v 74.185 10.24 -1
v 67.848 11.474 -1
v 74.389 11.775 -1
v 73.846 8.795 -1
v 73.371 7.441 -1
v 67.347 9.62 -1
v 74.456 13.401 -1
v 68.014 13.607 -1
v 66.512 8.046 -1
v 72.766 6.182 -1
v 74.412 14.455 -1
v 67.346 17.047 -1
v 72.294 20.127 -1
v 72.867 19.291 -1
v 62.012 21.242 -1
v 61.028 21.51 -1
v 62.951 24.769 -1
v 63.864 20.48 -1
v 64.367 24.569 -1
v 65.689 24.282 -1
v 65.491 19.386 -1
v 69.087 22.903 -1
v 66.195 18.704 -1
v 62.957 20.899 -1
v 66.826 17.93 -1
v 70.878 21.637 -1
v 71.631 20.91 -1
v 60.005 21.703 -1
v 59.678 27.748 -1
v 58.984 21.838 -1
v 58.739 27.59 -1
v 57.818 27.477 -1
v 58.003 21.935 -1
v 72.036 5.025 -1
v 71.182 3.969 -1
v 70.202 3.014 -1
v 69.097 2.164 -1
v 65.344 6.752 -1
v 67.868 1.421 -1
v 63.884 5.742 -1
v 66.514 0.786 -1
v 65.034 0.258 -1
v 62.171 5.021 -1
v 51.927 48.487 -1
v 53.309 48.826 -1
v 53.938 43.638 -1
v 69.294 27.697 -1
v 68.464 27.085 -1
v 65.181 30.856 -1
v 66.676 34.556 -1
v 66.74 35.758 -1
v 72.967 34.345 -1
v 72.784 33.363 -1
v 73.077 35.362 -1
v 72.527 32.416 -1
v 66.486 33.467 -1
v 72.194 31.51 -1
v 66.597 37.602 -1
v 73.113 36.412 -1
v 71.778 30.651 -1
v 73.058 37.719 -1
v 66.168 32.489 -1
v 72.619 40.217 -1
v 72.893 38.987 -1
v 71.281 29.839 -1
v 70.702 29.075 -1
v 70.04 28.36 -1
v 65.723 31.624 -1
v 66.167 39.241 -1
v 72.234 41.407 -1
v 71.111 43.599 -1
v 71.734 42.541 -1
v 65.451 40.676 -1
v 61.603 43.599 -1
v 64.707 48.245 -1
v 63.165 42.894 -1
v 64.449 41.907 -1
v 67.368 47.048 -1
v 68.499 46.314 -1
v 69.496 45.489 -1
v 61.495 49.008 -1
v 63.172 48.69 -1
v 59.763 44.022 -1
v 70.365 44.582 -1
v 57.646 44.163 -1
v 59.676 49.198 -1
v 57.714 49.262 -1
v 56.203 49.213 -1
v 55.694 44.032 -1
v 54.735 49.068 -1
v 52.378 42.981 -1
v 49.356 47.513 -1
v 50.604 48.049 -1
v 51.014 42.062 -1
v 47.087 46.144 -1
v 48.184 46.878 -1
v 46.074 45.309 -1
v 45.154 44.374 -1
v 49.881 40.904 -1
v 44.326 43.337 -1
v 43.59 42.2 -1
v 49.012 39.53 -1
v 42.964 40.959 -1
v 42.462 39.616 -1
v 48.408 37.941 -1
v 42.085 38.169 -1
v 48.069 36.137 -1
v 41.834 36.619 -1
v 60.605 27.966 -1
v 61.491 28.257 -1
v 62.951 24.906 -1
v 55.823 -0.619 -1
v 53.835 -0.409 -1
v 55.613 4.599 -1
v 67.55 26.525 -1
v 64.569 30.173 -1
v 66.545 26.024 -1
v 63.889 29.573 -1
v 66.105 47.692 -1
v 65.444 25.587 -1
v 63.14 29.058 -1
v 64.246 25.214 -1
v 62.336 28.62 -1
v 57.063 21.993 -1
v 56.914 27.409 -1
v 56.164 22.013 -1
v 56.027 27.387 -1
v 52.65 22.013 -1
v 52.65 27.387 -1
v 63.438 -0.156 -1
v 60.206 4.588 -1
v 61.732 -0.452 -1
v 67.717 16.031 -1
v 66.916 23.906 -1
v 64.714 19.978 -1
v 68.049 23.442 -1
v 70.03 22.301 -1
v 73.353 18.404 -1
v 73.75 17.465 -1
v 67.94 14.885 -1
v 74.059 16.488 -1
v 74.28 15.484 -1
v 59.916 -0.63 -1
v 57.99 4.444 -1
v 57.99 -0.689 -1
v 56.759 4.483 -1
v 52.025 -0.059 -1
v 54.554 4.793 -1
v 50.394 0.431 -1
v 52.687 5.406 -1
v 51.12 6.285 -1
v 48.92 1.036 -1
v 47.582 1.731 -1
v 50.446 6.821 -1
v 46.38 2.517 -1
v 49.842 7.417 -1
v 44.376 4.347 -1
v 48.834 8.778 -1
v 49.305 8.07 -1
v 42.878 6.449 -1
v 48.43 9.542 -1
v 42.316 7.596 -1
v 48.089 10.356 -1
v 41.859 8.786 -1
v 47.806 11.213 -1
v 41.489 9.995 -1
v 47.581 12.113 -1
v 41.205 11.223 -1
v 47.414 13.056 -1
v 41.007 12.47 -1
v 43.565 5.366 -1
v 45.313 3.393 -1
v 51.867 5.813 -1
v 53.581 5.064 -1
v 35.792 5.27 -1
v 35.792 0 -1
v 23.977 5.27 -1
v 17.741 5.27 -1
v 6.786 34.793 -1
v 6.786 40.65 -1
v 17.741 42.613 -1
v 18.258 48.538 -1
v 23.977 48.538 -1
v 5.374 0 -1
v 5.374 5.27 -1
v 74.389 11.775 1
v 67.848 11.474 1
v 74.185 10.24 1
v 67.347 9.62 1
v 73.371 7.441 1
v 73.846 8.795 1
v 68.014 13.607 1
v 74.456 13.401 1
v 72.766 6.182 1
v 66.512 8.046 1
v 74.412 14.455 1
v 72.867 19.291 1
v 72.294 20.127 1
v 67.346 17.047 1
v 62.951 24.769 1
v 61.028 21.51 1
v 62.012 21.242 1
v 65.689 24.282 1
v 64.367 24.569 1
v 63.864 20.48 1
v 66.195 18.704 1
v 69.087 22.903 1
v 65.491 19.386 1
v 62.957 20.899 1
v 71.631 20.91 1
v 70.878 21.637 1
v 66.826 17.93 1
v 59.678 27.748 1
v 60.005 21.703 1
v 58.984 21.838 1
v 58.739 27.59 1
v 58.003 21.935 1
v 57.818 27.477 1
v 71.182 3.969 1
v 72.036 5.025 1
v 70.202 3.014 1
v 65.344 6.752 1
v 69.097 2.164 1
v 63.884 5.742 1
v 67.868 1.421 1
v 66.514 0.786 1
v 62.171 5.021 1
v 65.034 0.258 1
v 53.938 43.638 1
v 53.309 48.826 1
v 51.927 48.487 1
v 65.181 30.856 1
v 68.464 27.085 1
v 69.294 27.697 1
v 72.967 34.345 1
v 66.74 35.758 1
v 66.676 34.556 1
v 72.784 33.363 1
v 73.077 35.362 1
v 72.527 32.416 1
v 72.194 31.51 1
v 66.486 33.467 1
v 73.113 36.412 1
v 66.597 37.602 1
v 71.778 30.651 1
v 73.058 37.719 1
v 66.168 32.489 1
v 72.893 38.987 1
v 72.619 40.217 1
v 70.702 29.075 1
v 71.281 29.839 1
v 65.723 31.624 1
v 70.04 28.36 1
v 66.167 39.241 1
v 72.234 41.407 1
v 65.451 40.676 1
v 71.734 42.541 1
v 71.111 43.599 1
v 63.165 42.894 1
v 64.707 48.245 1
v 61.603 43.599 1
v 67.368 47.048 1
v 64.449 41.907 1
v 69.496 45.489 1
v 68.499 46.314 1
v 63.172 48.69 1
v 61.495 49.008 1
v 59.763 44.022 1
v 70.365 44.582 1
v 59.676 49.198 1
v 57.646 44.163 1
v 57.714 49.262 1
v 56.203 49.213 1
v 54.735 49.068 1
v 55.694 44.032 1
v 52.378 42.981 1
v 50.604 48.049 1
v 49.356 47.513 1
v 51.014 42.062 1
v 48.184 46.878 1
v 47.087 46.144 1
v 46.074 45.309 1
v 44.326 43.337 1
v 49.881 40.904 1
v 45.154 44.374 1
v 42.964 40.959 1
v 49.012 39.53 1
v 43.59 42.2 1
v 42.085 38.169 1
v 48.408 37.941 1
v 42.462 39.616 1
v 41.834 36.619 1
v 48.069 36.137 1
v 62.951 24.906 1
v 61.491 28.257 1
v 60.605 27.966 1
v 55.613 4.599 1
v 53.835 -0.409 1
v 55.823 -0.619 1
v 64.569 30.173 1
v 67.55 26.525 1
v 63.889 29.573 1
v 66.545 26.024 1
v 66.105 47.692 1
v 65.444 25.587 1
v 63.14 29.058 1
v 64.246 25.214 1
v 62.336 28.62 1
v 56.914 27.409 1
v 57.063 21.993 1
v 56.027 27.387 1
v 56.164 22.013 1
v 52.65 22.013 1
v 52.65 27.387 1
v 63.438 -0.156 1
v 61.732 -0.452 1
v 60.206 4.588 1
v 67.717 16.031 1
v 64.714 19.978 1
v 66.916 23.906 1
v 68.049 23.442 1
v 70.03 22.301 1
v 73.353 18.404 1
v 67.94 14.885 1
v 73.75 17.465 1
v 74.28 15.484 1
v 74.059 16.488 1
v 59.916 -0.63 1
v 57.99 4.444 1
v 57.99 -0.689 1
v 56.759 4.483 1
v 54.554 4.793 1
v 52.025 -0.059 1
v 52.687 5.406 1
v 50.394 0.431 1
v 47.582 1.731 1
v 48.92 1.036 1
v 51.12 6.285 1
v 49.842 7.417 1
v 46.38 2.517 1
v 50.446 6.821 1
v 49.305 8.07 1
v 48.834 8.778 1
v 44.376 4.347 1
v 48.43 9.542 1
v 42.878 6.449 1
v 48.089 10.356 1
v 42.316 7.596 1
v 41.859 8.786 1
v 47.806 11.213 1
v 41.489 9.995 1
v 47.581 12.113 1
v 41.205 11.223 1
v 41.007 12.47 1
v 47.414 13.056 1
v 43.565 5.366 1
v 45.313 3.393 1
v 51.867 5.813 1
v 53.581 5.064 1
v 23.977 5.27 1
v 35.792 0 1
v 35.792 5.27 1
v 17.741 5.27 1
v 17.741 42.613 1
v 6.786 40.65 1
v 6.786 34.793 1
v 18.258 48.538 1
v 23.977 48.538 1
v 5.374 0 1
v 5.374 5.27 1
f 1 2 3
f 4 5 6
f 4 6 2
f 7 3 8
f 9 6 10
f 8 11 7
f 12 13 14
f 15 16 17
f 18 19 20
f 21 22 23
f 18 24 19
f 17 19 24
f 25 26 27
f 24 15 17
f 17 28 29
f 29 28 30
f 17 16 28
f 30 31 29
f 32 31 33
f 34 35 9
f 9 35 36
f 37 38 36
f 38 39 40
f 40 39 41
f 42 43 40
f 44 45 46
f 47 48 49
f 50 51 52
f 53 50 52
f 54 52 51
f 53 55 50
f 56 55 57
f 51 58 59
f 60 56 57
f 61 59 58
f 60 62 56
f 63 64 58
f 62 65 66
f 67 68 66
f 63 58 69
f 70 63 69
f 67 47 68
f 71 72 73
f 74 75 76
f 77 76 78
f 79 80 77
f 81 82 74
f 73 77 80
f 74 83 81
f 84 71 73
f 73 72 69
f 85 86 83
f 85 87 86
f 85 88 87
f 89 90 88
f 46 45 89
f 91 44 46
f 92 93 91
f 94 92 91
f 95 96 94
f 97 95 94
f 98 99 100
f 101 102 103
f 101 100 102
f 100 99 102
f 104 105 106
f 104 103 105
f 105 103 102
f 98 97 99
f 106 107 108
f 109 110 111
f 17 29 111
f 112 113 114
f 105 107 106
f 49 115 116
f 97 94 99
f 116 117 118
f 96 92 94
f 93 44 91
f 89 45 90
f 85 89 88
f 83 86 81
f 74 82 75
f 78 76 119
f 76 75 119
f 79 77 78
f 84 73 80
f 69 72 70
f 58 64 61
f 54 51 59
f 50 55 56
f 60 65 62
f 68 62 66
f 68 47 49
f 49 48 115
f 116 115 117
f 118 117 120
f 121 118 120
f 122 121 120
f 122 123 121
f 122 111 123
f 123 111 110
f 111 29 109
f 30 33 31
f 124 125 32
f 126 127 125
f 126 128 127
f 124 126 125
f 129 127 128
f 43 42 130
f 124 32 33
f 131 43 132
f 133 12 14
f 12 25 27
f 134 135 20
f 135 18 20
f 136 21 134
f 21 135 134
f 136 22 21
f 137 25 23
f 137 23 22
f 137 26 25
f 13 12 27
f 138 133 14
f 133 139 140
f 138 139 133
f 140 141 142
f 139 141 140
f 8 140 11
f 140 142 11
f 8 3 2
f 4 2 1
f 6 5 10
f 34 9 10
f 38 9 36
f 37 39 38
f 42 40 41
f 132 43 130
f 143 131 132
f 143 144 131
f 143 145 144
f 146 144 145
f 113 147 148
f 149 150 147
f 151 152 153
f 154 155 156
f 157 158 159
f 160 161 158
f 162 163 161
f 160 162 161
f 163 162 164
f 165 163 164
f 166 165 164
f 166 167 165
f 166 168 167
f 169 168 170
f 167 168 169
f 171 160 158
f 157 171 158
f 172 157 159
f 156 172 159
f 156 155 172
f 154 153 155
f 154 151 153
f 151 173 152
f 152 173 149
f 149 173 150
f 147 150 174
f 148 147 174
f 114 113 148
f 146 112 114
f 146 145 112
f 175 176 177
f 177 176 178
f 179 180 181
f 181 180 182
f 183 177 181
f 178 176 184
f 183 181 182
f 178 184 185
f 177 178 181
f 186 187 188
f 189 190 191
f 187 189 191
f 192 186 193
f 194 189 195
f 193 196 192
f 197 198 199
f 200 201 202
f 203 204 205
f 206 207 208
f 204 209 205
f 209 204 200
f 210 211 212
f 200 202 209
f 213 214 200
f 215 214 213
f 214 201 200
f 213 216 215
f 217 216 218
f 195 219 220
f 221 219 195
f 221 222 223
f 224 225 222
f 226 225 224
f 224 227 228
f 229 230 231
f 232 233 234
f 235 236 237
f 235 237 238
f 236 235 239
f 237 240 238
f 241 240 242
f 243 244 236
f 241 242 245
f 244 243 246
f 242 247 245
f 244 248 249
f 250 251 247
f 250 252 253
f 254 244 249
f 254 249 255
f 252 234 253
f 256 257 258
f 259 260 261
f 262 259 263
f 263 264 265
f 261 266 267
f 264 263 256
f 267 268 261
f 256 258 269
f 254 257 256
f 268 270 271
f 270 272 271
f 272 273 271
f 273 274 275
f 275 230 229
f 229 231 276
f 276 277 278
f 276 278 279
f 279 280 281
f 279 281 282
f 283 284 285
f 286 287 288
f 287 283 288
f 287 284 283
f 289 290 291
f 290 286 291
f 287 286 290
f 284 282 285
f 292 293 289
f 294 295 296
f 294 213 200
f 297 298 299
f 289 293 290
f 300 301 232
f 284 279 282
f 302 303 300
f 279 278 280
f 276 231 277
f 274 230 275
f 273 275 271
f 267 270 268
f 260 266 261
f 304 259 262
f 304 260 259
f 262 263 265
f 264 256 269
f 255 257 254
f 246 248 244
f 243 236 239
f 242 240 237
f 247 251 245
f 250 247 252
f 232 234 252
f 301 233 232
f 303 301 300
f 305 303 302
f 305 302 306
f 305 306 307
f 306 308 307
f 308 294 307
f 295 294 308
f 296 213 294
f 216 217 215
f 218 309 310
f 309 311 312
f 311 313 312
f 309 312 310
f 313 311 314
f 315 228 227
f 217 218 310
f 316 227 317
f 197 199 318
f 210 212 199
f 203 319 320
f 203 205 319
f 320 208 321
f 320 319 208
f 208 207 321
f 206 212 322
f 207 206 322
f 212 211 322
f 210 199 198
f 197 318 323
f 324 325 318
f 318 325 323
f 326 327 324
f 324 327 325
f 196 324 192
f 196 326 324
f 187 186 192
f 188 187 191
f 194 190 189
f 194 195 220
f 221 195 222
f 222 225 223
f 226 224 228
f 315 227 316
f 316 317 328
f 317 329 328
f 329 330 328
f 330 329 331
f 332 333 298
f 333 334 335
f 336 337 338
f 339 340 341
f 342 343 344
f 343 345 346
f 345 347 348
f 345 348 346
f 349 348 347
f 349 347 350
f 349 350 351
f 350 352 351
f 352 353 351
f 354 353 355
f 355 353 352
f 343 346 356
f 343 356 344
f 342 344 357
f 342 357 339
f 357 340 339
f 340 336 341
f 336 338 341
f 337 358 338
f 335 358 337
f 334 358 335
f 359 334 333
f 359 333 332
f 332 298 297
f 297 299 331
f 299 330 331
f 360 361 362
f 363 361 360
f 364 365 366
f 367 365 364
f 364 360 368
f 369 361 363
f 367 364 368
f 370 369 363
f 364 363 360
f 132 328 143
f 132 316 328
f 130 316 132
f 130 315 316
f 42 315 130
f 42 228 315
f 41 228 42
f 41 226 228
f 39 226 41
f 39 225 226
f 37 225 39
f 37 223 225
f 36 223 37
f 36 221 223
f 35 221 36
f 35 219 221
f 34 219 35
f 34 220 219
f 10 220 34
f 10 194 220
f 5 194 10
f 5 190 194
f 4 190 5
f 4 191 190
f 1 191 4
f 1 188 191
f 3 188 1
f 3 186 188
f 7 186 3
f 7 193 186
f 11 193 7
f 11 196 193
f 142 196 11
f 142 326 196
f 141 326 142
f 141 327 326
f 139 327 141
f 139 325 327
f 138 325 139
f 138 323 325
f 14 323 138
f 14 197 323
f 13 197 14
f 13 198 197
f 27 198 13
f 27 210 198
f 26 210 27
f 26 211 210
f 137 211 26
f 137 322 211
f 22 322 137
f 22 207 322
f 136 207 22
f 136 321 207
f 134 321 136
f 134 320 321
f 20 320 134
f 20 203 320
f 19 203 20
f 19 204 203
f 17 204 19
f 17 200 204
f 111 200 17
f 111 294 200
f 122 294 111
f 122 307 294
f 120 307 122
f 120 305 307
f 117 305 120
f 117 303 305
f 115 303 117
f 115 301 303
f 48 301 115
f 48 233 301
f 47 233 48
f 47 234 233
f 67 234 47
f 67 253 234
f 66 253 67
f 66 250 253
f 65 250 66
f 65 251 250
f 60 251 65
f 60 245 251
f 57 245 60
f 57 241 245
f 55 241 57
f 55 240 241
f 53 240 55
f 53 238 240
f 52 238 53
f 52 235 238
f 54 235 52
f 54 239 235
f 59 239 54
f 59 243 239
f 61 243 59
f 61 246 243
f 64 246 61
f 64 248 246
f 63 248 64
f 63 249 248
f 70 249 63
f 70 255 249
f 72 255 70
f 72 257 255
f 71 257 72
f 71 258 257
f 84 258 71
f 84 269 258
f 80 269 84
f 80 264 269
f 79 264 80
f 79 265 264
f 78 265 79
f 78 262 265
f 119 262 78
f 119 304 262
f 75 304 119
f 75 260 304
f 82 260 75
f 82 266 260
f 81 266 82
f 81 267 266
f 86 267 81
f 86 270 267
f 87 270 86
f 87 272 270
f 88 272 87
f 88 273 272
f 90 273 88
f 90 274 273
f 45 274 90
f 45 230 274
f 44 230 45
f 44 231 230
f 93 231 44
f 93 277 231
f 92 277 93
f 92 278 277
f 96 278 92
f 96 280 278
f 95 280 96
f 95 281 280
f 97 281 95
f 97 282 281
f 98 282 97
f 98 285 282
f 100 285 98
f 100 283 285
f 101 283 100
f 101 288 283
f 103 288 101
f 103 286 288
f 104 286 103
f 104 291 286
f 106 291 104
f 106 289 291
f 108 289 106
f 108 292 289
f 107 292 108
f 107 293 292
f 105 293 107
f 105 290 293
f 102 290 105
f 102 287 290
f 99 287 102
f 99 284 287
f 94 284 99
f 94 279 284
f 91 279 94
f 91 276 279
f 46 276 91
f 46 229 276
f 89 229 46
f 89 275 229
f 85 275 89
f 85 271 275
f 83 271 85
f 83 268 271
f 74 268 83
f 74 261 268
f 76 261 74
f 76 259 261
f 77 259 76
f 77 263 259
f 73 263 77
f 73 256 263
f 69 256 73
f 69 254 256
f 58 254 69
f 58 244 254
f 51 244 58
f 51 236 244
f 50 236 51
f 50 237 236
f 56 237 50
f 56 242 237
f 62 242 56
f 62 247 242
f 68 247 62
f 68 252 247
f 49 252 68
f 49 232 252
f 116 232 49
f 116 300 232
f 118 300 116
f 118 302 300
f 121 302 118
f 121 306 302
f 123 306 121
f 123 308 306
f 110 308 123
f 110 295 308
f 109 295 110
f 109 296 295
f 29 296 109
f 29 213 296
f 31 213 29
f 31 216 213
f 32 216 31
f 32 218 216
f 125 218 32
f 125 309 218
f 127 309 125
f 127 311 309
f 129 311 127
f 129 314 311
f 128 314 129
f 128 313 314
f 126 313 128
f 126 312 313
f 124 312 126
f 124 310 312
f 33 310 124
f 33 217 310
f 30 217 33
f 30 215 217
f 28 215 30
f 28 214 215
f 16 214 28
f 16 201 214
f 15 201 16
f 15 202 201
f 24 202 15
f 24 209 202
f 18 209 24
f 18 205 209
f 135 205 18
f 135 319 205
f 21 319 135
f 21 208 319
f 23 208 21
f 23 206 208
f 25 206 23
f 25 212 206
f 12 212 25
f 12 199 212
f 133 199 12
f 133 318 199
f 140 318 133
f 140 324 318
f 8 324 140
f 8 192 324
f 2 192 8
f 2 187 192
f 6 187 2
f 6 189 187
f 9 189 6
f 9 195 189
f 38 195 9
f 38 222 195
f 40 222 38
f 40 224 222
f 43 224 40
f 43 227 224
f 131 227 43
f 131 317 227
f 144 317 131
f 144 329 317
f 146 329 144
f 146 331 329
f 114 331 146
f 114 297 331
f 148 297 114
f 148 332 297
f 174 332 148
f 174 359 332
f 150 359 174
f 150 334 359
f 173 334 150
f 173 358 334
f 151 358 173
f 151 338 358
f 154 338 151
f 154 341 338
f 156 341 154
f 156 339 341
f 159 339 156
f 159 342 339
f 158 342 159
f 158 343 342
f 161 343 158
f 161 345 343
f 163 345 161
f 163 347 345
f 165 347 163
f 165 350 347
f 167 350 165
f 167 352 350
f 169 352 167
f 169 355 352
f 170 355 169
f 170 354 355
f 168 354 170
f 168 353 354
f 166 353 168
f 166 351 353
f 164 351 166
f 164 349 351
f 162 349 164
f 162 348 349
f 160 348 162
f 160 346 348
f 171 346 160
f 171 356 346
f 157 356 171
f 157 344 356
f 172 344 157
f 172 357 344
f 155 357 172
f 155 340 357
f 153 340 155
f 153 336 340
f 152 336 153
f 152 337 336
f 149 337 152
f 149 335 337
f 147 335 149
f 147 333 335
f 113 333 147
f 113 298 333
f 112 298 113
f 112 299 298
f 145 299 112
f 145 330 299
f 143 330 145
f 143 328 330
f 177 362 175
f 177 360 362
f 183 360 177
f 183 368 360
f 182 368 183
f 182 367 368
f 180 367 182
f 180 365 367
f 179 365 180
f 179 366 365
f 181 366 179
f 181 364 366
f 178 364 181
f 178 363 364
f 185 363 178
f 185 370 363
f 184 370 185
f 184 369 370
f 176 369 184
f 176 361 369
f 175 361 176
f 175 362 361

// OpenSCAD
size=convertFromInches(2);
numbers = [1, 2, 3, 5, 8, 13];
numberDepth = 2;
fontSize = 1 * size;

difference(){
    cube([size,size,size], center=true);
    !linear_extrude(height = numberDepth, center = true) {
        text("13", fontSize, halign=[50, "center"]);
    }
}

function convertFromInches(inches) = inches * 2.54 * 10;
